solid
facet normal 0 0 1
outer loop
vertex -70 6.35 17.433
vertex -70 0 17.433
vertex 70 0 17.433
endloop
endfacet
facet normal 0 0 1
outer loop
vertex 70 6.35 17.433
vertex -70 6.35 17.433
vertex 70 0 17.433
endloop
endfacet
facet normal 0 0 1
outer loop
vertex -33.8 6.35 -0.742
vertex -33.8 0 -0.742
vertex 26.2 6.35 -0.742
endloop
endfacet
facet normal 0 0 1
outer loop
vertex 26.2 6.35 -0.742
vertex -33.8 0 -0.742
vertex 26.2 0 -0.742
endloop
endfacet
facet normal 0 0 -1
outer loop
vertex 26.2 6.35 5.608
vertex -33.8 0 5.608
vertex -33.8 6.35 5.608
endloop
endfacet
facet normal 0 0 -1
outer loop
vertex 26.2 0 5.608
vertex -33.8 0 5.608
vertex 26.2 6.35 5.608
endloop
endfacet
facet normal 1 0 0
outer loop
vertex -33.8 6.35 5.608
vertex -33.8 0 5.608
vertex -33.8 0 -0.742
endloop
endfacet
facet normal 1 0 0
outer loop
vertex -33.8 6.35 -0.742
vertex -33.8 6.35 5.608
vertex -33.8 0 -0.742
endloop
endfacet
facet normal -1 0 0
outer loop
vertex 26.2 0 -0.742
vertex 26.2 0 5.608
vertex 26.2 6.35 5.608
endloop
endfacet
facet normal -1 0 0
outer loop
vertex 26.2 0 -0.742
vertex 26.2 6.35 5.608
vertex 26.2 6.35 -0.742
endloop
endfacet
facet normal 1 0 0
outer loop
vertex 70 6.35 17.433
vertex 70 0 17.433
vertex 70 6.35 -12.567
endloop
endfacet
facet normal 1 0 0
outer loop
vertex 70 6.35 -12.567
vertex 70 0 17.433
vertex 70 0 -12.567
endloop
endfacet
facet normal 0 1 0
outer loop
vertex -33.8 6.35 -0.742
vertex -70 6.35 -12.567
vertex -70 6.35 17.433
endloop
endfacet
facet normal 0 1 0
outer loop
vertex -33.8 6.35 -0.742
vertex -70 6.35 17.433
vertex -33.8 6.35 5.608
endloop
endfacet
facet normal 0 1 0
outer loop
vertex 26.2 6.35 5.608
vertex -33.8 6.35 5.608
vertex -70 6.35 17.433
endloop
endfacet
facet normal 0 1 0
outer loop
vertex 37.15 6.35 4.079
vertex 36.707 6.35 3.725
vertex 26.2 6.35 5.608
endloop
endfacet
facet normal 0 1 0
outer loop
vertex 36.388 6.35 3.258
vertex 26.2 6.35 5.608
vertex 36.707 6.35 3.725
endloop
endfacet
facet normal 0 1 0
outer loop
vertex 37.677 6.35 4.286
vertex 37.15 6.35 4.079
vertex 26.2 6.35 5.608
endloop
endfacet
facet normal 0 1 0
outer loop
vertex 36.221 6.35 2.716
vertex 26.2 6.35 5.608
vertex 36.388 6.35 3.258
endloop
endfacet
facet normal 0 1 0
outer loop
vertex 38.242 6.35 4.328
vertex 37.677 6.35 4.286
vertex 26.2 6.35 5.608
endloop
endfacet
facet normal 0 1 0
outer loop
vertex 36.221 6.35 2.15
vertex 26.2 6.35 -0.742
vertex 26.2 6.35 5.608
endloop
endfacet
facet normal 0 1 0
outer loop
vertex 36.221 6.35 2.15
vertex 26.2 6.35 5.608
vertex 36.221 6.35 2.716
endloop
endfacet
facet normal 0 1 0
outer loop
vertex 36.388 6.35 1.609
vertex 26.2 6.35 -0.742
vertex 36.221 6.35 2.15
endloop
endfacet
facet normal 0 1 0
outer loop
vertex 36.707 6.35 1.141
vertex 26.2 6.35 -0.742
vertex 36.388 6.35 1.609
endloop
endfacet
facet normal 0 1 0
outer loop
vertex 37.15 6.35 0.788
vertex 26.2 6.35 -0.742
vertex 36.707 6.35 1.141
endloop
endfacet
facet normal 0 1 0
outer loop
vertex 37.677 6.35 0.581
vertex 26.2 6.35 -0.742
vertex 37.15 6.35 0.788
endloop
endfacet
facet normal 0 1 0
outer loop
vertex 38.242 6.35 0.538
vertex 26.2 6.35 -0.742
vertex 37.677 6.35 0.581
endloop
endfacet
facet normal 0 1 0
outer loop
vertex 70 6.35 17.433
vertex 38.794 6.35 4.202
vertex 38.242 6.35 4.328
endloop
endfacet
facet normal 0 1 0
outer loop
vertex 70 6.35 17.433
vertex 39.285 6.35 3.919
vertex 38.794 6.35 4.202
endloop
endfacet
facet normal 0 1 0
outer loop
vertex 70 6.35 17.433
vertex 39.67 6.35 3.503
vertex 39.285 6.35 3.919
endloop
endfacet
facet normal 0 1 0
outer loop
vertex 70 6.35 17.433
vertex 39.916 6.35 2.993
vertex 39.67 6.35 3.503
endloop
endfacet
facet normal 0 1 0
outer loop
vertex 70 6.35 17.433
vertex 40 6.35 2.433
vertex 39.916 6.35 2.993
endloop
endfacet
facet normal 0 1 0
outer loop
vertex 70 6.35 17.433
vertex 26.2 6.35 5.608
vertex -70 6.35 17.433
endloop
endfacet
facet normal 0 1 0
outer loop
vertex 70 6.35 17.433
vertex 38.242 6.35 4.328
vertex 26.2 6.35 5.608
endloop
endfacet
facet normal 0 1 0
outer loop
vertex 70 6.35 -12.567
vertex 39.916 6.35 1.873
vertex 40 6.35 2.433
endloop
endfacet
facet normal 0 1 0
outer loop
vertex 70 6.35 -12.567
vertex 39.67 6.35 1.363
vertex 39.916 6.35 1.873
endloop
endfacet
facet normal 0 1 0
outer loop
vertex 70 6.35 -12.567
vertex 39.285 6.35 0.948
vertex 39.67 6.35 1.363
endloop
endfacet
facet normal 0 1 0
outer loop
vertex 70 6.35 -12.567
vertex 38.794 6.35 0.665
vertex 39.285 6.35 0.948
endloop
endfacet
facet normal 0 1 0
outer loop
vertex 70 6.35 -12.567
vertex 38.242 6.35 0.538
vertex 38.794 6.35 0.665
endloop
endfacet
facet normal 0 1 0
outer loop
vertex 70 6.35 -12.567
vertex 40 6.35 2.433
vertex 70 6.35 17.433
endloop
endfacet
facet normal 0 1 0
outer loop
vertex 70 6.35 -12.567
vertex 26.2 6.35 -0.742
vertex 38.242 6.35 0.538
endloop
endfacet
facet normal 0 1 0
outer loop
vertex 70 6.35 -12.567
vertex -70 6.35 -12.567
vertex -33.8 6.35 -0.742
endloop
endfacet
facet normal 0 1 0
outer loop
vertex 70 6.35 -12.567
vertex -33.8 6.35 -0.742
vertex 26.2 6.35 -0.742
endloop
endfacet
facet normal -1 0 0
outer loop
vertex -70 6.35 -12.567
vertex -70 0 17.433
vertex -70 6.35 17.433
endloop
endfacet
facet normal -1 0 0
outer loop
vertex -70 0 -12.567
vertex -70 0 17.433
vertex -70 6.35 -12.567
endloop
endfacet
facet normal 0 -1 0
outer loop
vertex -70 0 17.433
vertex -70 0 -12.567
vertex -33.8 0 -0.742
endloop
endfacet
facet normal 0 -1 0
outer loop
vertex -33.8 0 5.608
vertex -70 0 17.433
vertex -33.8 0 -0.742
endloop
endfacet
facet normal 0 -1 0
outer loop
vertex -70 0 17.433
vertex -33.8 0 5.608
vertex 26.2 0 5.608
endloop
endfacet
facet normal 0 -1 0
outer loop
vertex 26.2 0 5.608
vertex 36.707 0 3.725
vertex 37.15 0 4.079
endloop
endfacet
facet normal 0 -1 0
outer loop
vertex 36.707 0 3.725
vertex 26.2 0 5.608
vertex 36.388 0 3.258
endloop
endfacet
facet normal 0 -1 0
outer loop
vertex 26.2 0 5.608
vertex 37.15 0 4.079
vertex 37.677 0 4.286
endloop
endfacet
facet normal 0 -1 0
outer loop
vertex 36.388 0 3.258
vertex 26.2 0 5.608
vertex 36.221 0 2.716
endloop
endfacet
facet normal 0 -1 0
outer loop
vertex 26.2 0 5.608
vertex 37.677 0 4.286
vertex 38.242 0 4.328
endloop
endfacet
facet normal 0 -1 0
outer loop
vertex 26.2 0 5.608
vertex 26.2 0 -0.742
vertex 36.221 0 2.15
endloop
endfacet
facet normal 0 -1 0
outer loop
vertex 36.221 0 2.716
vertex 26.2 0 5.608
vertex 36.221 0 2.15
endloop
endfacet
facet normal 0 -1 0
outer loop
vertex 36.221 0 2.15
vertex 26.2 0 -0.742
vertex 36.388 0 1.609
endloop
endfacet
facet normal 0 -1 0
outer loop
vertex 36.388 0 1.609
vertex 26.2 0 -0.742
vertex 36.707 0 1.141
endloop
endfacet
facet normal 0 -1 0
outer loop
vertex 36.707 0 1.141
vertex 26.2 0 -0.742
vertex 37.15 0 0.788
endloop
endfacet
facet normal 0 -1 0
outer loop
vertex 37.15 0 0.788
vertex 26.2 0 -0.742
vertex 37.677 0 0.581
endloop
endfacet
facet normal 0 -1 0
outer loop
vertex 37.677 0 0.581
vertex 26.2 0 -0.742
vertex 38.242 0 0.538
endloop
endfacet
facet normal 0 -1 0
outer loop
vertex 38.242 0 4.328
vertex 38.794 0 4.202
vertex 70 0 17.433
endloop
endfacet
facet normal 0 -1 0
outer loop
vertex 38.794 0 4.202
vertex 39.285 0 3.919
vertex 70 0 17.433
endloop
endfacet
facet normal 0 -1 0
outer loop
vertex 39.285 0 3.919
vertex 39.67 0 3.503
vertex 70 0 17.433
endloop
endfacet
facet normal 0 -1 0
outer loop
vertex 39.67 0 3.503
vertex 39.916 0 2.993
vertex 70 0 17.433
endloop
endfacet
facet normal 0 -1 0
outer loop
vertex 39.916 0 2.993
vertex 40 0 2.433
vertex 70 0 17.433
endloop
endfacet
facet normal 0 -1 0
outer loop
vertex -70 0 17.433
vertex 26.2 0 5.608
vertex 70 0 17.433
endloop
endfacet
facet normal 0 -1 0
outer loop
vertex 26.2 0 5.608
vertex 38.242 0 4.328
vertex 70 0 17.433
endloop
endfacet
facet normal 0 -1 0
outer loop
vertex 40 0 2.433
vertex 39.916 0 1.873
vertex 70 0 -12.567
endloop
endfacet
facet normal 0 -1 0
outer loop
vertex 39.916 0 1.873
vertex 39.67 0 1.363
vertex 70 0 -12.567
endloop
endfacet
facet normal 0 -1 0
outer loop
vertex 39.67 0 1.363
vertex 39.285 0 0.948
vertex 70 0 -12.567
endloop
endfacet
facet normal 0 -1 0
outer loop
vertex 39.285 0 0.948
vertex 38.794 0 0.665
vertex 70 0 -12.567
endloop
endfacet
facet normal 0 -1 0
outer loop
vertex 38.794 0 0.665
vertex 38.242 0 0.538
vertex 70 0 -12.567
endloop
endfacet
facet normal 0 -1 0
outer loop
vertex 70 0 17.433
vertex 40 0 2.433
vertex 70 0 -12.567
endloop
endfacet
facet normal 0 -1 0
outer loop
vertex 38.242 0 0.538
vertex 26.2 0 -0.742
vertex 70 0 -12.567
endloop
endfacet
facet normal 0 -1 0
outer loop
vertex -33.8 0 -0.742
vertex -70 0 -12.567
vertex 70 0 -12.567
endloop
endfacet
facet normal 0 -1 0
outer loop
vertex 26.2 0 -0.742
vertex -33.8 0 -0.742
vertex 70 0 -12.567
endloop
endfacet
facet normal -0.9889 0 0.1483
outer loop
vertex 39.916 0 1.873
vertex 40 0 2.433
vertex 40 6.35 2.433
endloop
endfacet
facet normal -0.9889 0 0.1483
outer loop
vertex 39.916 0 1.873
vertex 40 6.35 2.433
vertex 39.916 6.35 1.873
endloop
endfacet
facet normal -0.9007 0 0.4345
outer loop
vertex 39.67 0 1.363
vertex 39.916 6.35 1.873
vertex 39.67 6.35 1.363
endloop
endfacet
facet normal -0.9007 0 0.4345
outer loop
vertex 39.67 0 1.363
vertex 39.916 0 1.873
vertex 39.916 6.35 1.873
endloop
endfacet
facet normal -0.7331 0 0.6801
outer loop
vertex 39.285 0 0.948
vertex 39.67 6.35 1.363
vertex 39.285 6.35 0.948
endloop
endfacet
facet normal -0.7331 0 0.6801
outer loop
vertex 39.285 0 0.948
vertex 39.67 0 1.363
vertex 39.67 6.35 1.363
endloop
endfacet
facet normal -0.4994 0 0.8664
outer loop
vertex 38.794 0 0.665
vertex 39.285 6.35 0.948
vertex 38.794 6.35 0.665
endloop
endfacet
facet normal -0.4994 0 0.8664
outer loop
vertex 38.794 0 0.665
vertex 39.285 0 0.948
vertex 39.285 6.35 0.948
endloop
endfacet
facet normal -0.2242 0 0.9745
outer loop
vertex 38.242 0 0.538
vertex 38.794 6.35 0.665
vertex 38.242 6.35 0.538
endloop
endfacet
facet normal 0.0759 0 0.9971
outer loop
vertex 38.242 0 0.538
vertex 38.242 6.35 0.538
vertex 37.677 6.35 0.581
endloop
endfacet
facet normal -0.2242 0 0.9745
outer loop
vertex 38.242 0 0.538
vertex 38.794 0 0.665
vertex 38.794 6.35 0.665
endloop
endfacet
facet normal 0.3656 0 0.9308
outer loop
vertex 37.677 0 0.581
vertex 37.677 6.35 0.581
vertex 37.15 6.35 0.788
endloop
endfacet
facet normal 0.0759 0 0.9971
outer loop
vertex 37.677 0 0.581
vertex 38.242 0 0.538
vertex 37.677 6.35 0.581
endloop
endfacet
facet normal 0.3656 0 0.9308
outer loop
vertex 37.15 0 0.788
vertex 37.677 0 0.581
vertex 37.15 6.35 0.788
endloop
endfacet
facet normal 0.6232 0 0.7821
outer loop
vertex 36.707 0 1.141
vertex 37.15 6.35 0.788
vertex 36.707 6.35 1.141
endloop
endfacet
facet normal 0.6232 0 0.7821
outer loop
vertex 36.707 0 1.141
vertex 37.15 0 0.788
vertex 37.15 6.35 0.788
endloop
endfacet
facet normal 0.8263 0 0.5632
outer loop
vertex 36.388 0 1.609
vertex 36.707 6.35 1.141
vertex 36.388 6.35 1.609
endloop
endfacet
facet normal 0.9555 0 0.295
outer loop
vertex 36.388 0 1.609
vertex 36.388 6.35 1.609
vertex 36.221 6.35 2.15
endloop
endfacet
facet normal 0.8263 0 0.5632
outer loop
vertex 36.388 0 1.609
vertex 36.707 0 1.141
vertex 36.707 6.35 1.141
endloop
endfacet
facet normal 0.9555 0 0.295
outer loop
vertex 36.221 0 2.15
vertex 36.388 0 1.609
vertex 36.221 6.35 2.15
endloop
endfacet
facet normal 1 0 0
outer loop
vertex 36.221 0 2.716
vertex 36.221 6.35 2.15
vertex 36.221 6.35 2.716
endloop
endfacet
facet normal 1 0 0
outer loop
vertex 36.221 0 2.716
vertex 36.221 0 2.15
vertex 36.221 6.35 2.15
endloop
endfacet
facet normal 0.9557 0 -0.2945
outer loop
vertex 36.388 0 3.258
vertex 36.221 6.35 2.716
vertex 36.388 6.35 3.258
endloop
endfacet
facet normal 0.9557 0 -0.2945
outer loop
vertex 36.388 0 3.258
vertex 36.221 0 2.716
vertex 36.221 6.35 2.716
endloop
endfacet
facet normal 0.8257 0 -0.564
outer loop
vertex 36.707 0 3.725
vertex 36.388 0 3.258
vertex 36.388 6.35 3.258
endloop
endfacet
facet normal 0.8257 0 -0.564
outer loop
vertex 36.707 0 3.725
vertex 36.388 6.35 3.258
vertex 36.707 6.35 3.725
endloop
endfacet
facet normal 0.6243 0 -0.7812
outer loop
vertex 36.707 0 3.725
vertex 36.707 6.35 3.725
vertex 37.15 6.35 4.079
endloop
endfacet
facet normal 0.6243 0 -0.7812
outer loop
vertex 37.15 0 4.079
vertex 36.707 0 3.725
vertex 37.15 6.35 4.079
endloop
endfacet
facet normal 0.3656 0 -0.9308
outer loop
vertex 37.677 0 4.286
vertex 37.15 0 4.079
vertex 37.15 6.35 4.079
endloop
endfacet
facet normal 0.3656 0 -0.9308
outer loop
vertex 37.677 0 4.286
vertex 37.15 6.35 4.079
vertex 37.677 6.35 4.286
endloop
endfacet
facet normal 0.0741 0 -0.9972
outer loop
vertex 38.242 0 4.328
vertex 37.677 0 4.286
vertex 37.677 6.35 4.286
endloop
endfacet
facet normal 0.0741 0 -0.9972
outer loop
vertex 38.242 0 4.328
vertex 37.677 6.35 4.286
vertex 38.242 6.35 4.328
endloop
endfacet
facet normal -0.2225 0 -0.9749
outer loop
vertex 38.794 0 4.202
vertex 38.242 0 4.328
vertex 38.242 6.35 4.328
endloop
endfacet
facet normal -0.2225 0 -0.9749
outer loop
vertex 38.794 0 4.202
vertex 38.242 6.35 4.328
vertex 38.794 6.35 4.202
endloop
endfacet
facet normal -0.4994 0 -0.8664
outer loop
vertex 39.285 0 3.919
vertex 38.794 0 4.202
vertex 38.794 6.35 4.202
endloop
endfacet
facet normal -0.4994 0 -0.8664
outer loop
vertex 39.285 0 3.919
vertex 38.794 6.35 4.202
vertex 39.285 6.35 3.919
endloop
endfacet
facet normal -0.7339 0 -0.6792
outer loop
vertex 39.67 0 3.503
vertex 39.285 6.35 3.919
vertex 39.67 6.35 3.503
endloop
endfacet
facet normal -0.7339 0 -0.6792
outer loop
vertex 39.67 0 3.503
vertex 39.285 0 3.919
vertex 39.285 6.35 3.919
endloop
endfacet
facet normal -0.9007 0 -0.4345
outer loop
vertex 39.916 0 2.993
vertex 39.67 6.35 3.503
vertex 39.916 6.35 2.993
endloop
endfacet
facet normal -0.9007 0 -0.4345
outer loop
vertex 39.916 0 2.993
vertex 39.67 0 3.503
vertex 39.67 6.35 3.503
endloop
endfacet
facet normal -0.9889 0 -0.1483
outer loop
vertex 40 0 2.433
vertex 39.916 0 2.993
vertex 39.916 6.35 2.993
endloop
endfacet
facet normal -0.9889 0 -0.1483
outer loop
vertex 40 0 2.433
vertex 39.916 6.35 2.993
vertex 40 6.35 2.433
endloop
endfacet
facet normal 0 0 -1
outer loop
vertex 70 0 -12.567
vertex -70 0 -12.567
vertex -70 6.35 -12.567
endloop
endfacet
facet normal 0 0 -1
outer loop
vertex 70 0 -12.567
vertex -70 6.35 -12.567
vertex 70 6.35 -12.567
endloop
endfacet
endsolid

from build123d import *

# Parameters (mm, degrees)
SKETCH1_W           = 140
SKETCH1_H           = 30
SKETCH1_R           = 1.9
SKETCH1_W_2         = 60
SKETCH1_H_2         = 6.35
BOSS_EXTRUDE1_DEPTH = 6.35


with BuildPart() as part:
    # Sketch1 → Boss-Extrude1 (new body)
    with BuildSketch(Plane(origin=(0, 0, 0), x_dir=(1, 0, 0), z_dir=(0, 1, 0))):
        with Locations((0, -2.433171599)):
            Rectangle(SKETCH1_W, SKETCH1_H)
        with Locations((38.1, -2.433171599)):
            Circle(SKETCH1_R, mode=Mode.SUBTRACT)
        with Locations((-3.8, -2.433171599)):
            Rectangle(SKETCH1_W_2, SKETCH1_H_2, mode=Mode.SUBTRACT)
    extrude(amount=BOSS_EXTRUDE1_DEPTH)


solid = part.part
